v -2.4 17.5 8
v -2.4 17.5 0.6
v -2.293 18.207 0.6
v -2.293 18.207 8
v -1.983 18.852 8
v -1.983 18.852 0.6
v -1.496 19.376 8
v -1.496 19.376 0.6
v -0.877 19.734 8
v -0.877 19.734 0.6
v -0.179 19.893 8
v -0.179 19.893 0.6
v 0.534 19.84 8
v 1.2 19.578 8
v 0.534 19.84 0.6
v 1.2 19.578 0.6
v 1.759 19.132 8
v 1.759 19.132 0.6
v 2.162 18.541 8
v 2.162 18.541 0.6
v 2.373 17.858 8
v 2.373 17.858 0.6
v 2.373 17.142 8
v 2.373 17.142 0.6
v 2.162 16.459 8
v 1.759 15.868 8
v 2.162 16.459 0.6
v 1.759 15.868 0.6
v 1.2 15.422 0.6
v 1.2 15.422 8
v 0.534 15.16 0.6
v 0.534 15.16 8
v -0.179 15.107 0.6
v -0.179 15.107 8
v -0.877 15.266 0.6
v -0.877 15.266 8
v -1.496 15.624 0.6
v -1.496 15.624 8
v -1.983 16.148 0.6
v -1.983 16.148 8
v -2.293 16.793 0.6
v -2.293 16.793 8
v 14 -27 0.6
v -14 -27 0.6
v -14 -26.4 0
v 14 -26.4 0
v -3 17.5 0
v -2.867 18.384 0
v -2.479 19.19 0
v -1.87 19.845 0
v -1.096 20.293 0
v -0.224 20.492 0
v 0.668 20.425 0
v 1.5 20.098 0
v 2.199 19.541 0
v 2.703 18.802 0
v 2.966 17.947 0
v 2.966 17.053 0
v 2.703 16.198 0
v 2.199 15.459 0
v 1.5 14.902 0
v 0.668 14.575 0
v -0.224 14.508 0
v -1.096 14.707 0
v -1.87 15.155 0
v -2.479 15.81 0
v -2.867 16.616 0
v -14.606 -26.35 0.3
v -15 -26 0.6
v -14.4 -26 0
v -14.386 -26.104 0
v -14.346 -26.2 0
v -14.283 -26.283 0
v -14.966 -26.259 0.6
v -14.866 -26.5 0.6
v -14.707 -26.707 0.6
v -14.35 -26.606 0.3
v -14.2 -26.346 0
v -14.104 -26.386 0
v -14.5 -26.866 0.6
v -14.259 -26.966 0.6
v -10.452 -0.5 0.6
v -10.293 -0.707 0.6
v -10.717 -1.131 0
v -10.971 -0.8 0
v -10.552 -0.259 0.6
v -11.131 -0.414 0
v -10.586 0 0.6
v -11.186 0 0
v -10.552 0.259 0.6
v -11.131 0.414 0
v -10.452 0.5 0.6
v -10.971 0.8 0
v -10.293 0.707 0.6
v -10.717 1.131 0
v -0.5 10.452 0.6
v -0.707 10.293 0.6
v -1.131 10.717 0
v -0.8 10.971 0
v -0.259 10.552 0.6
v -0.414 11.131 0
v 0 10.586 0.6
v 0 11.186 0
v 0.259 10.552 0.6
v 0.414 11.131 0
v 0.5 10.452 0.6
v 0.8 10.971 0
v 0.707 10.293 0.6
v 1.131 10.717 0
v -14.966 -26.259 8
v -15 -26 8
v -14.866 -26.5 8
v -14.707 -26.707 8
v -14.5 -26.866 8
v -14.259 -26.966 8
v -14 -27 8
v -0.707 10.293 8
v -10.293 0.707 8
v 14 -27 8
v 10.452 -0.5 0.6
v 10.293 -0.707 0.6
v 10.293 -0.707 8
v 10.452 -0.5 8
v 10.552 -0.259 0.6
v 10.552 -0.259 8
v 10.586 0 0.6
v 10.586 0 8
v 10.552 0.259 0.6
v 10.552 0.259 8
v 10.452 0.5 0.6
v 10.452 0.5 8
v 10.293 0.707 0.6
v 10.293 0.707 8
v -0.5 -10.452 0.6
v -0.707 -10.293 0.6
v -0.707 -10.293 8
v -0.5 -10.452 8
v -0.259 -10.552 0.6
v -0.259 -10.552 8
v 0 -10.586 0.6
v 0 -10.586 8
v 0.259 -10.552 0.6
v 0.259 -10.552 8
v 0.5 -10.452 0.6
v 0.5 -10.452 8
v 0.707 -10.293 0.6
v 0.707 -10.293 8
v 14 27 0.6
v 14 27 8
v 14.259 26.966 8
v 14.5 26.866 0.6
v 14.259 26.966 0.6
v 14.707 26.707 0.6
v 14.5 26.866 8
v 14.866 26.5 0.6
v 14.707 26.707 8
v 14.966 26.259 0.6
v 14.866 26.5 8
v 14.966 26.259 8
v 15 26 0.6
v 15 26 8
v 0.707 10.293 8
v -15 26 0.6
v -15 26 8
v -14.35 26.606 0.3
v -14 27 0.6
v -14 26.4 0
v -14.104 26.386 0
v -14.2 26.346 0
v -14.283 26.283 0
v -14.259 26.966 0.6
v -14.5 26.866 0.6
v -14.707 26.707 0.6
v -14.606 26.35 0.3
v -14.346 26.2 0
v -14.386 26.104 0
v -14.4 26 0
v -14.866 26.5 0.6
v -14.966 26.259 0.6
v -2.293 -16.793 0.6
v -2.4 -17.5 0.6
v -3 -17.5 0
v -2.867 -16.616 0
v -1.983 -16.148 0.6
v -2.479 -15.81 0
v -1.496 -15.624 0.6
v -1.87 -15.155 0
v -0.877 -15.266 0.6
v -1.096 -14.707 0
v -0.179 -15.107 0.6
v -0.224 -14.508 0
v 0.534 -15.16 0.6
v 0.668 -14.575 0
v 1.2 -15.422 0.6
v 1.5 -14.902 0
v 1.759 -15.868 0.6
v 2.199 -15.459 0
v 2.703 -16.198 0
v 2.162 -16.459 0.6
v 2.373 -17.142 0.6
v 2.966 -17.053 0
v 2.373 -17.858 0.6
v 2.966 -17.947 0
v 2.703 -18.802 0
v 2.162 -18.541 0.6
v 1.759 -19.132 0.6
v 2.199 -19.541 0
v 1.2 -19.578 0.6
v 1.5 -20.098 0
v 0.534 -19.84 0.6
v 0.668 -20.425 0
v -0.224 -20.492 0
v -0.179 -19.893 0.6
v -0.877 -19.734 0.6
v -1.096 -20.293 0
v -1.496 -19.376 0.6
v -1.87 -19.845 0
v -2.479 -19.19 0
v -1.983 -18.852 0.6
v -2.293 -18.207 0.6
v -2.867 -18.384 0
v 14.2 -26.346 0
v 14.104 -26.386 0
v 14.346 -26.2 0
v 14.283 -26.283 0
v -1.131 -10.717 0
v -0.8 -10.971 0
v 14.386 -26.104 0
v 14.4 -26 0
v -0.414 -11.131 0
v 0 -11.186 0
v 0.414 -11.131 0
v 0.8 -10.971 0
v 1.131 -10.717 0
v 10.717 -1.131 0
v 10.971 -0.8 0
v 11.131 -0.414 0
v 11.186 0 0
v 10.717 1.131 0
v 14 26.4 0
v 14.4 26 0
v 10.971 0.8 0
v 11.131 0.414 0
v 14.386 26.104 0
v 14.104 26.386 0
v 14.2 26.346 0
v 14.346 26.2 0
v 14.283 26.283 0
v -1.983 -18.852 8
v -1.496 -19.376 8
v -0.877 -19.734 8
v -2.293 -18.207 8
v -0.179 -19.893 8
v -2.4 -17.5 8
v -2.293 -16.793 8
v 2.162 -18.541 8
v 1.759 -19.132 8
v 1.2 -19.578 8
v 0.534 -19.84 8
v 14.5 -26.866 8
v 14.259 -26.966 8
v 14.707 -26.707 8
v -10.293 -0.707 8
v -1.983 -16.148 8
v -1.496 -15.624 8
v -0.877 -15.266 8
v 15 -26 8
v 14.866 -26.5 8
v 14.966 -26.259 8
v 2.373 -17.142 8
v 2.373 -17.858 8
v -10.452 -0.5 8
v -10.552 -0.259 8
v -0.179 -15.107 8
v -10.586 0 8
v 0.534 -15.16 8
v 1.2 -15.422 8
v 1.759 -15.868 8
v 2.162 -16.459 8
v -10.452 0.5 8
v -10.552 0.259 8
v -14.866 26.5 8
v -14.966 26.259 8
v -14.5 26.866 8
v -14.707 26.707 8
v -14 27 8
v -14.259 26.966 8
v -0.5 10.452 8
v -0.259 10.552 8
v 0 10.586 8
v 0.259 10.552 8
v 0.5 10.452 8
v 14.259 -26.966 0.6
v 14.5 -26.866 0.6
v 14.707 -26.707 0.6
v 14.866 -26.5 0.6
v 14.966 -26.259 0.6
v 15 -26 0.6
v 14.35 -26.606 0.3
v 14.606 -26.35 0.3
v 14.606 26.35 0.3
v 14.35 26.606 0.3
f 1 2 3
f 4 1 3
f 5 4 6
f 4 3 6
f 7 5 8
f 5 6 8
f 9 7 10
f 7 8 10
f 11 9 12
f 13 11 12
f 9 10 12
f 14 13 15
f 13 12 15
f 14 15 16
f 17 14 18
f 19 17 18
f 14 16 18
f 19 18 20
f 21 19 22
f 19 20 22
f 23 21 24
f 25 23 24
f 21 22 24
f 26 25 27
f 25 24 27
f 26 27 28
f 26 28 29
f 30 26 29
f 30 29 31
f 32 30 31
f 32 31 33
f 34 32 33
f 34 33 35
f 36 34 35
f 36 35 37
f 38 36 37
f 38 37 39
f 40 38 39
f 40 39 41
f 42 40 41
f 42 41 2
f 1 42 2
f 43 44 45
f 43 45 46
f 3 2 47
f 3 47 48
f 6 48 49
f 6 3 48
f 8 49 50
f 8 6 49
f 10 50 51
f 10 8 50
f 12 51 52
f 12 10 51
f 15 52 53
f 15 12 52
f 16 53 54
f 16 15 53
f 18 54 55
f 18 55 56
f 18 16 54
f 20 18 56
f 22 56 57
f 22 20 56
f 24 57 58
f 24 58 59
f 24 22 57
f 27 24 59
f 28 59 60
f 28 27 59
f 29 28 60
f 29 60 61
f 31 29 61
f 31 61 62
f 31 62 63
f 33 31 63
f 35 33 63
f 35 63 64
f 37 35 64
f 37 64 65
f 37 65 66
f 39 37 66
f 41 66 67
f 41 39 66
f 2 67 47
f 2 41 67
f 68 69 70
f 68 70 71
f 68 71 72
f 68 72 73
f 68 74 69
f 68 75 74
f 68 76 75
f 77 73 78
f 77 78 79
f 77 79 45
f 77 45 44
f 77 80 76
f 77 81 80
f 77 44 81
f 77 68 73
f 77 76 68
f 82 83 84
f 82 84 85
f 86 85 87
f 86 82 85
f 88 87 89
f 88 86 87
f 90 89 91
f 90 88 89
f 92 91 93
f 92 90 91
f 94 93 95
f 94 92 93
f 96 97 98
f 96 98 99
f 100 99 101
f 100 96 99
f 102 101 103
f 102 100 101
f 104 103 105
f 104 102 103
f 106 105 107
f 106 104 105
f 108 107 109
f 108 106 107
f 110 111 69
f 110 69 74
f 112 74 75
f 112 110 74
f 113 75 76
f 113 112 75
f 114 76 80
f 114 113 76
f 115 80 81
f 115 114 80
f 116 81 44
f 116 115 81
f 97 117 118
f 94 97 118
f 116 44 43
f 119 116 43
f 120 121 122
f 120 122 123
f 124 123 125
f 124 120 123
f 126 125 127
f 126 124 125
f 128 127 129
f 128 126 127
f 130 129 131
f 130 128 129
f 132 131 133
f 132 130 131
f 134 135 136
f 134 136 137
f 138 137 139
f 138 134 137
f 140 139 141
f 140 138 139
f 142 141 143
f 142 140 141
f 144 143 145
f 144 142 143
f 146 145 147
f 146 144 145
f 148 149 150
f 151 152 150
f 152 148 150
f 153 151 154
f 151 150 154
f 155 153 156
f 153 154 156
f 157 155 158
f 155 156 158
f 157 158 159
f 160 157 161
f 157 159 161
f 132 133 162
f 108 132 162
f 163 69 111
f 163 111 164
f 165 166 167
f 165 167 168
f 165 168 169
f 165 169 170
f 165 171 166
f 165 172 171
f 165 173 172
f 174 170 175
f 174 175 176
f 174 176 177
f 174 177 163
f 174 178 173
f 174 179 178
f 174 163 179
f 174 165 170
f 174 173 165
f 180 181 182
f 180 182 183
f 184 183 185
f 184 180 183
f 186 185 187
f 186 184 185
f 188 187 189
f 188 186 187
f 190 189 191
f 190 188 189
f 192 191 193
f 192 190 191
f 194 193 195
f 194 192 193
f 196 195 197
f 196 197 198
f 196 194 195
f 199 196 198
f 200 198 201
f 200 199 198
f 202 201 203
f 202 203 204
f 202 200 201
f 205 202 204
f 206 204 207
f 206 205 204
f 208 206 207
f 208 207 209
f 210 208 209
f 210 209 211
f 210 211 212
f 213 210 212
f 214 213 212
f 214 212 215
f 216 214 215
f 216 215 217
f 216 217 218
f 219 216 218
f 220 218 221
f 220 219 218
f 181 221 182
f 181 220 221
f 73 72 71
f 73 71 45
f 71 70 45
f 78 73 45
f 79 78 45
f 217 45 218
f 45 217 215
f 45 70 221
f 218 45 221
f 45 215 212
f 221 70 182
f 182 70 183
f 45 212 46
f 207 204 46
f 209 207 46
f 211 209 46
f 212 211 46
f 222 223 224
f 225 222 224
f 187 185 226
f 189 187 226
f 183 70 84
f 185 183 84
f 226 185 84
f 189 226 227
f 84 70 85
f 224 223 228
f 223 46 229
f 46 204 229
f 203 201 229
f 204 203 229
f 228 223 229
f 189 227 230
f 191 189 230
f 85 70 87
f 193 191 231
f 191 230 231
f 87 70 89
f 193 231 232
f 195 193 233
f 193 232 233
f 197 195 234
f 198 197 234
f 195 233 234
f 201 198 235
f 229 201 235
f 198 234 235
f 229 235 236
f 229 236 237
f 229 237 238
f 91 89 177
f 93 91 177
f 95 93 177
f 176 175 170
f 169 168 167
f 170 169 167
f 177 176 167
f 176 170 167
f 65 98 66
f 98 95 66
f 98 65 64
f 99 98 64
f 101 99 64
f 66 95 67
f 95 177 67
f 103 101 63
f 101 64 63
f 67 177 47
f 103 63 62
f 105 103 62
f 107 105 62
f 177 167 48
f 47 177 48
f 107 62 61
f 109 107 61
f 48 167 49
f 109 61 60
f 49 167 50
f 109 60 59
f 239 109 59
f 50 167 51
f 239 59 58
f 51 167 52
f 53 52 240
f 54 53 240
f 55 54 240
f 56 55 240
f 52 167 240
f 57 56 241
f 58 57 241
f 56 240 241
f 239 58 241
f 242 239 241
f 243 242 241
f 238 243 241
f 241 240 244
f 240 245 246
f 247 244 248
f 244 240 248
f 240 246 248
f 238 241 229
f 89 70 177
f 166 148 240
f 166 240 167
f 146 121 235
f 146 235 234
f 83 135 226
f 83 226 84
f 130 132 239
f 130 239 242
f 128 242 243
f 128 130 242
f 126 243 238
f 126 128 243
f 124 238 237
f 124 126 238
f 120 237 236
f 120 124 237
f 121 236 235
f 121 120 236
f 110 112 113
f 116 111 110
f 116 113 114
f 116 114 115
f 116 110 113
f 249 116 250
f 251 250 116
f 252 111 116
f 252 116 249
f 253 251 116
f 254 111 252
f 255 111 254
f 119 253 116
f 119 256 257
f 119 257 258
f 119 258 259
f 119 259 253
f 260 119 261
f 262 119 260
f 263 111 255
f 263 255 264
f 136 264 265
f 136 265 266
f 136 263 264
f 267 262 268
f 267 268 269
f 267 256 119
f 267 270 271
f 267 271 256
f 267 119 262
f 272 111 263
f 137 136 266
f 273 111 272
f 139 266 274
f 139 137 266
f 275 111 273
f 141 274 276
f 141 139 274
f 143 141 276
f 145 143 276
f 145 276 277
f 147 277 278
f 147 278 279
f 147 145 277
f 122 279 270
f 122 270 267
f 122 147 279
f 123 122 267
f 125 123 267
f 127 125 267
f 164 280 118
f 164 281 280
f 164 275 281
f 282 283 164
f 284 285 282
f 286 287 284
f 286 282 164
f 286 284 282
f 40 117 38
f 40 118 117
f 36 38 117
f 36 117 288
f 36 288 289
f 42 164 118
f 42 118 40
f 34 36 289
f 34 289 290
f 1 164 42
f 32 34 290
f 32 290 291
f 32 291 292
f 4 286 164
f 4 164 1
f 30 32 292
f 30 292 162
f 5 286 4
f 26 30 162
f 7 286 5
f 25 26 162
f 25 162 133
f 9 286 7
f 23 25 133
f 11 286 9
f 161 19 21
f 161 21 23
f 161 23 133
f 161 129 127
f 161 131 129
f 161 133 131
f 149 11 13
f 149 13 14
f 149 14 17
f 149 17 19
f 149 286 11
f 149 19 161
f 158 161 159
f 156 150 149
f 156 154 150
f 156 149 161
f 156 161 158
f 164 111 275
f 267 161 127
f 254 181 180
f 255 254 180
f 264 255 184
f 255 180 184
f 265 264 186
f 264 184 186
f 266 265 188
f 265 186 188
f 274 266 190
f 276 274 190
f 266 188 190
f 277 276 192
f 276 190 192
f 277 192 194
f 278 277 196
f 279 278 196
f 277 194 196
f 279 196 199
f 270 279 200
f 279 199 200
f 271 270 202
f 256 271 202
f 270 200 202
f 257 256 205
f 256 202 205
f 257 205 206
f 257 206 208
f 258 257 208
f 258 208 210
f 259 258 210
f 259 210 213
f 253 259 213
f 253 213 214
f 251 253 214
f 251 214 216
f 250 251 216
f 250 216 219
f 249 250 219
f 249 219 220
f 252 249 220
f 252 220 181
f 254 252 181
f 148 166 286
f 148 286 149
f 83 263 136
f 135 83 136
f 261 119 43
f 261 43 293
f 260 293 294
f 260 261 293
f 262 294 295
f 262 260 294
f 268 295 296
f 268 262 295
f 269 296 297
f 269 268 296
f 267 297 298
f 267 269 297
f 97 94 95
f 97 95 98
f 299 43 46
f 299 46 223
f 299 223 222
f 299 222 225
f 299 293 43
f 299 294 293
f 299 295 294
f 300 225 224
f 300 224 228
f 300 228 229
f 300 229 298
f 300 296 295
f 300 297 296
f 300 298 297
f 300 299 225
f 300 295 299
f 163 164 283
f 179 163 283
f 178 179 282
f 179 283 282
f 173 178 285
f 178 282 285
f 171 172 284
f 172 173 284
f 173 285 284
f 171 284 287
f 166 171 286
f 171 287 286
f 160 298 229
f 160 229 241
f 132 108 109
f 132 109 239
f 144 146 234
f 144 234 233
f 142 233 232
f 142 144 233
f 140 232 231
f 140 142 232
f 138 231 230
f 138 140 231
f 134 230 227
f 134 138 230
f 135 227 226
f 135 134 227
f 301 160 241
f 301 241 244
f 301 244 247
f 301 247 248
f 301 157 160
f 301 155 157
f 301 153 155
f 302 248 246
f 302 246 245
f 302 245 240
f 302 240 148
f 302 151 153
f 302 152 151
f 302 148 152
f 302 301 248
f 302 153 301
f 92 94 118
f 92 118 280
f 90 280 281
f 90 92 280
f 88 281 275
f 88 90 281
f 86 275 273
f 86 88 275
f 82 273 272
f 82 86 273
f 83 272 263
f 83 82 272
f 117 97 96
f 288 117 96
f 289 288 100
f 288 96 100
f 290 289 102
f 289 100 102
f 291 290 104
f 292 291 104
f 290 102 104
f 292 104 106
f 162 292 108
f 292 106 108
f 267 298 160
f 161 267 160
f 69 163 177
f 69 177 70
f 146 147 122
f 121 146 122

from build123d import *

# Parameters (mm, degrees)
SKETCH1_W            = 30
SKETCH1_H            = 54
BOSS_EXTRUDE1_DEPTH  = 8
M4_CLEARANCE_HOLE1_D = 4.8
CUT_EXTRUDE1_REACH   = 33.906
FILLET1_R            = 1
CHAMFER1_SIZE        = 0.6


with BuildPart() as part:
    # Sketch1 → Boss-Extrude1 (new body)
    with BuildSketch(Plane.XY):
        Rectangle(SKETCH1_W, SKETCH1_H)
    extrude(amount=BOSS_EXTRUDE1_DEPTH)

    # M4 Clearance Hole1 (through all)
    with Locations(Plane.XY.offset(8)):
        with Locations((0, 17.5), (0, -17.5)):
            Hole(M4_CLEARANCE_HOLE1_D / 2)

    # Sketch4 → Cut-Extrude1 (cut, up to next)
    with BuildSketch(Plane.XY.offset(8), mode=Mode.PRIVATE) as cut_extrude1_sk1:
        Polygon((11, 0), (0, 11), (-11, 0), (0, -11), align=None)
    cut_extrude1_tool1 = extrude(cut_extrude1_sk1.sketch, amount=-CUT_EXTRUDE1_REACH, mode=Mode.PRIVATE) & part.part
    add(cut_extrude1_tool1.solids().sort_by_distance((0, 0, 8))[0], mode=Mode.SUBTRACT)

    # Fillet1
    fillet1_edges = [part.edges().sort_by_distance(p)[0] for p in [
        (11, 0, 4),
        (0, -11, 4),
        (-11, 0, 4),
        (0, 11, 4),
        (-15, 27, 4),
        (15, 27, 4),
        (15, -27, 4),
        (-15, -27, 4),
    ]]
    fillet(fillet1_edges, radius=FILLET1_R)

    # Chamfer1
    chamfer1_edges = [part.edges().sort_by_distance(p)[0] for p in [
        (2.4, -17.5, 0),
        (2.4, 17.5, 0),
        (5.5, -5.5, 0),
        (-5.5, -5.5, 0),
        (5.5, 5.5, 0),
        (-5.5, 5.5, 0),
        (15, 0, 0),
        (-15, 0, 0),
        (0, 27, 0),
        (0, -27, 0),
        (-14.707106781, 26.707106781, 0),
        (14.707106781, 26.707106781, 0),
        (-14.707106781, -26.707106781, 0),
        (14.707106781, -26.707106781, 0),
        (0, -10.585786438, 0),
        (10.585786438, 0, 0),
        (0, 10.585786438, 0),
        (-10.585786438, 0, 0),
    ]]
    chamfer(chamfer1_edges, length=CHAMFER1_SIZE)


solid = part.part
